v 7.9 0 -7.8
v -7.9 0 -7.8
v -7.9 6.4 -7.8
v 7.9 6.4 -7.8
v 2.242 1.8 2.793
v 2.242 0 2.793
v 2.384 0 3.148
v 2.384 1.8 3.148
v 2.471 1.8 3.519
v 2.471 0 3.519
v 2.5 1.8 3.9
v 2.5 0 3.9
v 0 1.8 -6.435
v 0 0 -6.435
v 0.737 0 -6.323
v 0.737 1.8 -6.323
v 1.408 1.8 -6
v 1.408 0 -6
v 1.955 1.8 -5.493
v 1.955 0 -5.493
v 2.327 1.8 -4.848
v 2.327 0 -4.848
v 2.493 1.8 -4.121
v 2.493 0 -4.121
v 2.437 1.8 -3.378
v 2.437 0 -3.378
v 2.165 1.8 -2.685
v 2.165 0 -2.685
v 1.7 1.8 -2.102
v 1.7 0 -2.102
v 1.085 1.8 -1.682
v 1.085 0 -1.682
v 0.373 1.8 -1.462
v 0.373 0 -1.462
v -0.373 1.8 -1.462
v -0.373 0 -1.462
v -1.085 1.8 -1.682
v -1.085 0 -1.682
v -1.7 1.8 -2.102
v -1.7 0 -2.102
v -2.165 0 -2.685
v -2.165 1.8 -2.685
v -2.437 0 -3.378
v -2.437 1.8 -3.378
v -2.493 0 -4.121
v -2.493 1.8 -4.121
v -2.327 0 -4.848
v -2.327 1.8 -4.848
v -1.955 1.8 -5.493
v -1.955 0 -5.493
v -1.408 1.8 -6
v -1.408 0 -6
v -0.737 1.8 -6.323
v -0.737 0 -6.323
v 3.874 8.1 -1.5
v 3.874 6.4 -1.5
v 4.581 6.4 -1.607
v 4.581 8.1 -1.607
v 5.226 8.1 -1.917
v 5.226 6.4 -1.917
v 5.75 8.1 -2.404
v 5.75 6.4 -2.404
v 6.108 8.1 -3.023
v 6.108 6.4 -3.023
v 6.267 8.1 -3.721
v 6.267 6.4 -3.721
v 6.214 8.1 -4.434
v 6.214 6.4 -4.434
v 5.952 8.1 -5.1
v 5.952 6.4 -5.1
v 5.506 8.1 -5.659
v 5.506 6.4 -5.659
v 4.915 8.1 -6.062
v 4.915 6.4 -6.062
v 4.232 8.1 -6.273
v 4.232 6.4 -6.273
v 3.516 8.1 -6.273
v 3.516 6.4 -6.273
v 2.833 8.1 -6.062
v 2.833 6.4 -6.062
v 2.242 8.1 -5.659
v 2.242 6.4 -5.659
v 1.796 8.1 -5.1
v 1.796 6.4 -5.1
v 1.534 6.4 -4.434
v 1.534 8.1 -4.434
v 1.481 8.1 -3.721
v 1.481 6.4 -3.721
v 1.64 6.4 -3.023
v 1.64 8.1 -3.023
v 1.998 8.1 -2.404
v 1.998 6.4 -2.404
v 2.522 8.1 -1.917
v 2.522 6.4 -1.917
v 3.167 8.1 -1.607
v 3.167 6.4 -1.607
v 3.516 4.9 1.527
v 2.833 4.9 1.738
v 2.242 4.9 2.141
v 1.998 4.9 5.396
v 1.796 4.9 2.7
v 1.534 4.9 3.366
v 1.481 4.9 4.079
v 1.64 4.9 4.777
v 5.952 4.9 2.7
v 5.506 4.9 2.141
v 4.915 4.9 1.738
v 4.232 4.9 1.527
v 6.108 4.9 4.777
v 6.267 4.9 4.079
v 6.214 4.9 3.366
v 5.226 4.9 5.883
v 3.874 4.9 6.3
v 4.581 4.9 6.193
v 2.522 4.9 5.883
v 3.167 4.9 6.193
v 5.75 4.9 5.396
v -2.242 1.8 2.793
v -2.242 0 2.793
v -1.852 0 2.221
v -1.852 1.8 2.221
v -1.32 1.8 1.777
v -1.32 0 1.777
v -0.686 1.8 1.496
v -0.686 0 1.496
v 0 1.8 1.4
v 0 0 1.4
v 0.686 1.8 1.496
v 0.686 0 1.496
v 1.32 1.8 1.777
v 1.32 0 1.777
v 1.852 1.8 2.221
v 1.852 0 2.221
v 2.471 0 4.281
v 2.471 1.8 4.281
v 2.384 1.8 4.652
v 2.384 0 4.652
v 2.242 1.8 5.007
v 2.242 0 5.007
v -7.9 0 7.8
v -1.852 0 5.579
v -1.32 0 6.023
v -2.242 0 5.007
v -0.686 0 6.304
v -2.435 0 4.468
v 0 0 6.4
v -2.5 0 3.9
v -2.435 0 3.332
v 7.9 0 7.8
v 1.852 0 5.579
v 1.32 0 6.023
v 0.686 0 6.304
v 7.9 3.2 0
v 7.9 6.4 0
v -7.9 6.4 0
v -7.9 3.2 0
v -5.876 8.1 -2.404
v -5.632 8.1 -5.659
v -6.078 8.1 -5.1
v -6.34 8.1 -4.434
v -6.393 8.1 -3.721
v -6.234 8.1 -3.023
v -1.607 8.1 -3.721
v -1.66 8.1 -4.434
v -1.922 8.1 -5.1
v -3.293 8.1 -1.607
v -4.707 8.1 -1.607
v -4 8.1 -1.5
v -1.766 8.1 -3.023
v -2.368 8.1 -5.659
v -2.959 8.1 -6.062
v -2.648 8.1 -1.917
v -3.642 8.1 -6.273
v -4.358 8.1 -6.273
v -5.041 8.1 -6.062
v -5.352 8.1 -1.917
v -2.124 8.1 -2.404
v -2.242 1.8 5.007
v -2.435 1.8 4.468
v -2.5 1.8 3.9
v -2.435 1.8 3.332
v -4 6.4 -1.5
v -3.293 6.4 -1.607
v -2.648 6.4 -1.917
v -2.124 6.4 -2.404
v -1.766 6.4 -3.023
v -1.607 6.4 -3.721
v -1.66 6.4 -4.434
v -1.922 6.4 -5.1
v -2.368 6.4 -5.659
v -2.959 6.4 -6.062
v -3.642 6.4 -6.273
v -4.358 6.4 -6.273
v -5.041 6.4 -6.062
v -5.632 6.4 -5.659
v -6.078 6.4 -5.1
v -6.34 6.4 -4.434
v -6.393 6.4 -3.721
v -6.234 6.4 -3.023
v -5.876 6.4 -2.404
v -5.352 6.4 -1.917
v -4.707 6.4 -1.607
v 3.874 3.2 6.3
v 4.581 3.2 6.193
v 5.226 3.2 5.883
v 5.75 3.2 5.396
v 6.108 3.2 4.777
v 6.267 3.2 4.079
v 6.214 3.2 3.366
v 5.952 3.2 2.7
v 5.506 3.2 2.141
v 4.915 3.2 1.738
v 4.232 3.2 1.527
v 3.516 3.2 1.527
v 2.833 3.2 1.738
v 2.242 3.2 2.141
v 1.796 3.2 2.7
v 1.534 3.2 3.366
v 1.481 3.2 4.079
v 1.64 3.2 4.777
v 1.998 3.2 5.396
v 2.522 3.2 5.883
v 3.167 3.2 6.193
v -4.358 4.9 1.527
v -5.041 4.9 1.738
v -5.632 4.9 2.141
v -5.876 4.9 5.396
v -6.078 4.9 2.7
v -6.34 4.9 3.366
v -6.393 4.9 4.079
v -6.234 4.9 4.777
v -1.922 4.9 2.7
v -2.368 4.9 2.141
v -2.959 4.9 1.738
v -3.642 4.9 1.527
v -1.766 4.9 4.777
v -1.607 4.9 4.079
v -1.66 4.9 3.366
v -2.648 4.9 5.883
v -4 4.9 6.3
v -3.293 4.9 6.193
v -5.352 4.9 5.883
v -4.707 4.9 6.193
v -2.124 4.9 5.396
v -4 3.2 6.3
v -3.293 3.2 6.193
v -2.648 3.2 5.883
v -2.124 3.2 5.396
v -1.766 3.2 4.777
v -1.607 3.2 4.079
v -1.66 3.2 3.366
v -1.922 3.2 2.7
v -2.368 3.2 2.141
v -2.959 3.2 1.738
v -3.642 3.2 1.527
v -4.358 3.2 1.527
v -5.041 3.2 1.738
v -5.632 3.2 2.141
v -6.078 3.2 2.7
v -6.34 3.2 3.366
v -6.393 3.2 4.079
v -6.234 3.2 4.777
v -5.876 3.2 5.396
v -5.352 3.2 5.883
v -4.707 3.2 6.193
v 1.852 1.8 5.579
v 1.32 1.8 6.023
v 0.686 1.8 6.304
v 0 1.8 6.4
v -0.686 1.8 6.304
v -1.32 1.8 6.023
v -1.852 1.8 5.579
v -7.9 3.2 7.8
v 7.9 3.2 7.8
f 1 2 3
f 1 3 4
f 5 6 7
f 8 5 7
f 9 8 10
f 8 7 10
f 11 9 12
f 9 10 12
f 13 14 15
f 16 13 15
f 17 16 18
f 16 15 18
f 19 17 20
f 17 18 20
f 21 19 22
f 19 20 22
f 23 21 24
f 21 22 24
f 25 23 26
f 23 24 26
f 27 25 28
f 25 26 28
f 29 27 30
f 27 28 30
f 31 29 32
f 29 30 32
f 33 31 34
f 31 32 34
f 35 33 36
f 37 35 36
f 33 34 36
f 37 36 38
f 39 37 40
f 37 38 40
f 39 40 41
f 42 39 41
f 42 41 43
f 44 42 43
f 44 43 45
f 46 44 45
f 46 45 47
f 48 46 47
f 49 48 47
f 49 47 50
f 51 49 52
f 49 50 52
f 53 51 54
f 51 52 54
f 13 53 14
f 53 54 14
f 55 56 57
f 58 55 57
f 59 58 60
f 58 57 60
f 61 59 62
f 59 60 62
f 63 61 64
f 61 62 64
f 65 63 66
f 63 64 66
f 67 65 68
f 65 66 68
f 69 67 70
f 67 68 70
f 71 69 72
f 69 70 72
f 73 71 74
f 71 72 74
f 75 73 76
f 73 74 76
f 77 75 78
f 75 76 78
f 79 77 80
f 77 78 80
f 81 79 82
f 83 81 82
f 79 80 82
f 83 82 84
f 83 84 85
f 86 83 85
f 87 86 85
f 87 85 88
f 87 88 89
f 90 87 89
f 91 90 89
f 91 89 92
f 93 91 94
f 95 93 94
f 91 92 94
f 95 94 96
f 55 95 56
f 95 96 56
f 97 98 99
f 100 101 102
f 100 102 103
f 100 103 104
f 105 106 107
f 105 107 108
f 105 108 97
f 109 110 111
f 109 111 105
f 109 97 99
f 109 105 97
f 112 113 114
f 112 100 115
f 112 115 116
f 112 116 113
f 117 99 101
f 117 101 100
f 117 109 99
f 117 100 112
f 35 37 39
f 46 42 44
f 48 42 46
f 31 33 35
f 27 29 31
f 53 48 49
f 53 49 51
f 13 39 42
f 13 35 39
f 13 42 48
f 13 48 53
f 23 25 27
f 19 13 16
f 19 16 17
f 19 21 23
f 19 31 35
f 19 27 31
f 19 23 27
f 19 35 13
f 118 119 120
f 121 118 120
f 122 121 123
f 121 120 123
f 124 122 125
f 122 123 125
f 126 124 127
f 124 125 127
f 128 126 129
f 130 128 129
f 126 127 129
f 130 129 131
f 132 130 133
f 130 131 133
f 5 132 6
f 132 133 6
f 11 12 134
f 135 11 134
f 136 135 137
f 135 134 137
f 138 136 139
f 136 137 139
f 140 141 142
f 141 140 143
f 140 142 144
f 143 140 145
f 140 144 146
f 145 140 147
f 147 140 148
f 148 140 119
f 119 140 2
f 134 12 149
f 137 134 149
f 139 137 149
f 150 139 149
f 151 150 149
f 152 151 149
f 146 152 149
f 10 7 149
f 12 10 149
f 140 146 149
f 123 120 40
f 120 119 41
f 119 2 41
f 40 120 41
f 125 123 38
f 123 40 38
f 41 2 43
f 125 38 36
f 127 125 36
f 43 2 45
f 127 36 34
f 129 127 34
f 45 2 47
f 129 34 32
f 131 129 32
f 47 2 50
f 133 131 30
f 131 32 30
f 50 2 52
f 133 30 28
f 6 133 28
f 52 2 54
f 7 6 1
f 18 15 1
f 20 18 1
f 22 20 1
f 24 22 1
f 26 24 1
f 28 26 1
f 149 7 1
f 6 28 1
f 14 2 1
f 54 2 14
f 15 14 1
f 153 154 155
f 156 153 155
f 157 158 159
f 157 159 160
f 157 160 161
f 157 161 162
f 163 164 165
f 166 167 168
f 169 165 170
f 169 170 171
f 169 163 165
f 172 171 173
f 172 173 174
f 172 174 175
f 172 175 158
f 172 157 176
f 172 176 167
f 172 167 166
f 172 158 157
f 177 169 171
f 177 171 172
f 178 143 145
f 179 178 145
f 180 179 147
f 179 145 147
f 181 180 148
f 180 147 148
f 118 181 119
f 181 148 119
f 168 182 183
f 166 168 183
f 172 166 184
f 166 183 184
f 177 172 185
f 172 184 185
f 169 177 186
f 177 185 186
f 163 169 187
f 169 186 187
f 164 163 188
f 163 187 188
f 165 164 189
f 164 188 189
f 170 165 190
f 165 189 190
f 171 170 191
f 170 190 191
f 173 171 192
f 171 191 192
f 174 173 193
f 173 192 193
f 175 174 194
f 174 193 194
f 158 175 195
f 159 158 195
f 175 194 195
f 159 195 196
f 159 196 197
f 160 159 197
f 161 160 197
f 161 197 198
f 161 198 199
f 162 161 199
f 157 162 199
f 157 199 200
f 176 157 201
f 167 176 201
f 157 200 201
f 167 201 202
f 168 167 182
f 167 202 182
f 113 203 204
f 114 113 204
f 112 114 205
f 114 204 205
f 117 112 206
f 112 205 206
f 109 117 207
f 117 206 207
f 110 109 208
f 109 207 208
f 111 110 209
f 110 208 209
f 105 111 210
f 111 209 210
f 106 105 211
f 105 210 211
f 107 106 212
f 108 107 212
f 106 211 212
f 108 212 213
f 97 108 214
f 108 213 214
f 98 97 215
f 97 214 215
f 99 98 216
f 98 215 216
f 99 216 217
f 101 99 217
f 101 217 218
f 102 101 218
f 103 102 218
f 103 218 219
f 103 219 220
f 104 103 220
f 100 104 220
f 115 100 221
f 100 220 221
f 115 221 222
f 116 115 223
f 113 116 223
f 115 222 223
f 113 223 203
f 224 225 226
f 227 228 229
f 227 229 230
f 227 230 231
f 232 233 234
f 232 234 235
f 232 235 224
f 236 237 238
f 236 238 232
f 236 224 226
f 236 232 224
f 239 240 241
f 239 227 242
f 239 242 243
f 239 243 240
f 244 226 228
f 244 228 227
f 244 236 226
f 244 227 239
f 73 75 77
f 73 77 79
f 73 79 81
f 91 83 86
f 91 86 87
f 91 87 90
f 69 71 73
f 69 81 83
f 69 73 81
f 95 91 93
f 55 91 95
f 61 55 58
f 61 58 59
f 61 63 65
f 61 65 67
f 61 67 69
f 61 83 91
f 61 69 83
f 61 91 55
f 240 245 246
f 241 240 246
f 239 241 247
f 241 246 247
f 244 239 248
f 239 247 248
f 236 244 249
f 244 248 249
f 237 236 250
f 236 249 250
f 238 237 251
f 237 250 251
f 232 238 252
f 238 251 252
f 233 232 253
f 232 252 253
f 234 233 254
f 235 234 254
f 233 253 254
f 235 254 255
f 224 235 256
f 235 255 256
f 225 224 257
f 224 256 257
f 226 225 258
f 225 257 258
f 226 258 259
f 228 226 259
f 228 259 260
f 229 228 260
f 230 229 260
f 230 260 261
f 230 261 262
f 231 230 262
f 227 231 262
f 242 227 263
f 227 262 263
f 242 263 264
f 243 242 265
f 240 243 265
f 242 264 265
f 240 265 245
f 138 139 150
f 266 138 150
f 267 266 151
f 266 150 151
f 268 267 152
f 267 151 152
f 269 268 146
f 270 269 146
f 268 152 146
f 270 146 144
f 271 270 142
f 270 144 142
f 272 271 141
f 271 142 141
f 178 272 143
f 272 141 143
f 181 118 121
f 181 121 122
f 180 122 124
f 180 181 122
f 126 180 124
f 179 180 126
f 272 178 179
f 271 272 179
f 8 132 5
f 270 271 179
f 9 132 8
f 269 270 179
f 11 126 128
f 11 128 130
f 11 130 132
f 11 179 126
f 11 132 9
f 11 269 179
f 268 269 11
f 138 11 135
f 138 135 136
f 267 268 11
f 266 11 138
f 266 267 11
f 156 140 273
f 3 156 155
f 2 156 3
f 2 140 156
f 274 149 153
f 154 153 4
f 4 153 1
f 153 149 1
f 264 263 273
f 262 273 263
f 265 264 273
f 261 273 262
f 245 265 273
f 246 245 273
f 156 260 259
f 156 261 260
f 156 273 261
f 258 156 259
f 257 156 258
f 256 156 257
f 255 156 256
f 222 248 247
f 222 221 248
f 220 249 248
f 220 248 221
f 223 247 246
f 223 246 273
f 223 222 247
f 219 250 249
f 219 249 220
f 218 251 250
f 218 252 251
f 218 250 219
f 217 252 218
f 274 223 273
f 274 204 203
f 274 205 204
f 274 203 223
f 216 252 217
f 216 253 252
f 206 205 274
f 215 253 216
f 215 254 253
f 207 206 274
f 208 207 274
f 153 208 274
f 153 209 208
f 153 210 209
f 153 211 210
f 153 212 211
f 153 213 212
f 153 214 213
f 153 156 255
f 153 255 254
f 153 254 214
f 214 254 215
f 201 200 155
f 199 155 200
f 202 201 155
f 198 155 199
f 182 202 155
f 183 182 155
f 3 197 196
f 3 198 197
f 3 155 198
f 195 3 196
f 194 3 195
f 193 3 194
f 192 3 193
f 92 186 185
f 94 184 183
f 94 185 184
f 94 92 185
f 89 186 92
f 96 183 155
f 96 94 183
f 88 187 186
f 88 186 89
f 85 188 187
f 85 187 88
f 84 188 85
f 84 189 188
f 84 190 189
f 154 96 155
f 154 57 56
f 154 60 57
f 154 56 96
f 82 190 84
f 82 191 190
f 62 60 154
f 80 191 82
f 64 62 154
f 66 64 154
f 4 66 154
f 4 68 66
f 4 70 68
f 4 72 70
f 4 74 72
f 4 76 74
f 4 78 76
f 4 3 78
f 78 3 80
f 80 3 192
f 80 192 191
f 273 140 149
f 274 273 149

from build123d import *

# Parameters (mm, degrees)
SKETCH_1_W          = 15.8
SKETCH_1_H          = 15.600000042
EXTRUDE_2_DEPTH     = 6.4
CUT_EXTRUDE_1_DEPTH = 3.2
SKETCH_3_R          = 2.400000003
EXTRUDE_3_DEPTH     = 1.7
SKETCH_4_R          = 2.4
EXTRUDE_4_DEPTH     = 1.7
CUT_EXTRUDE_2_DEPTH = 1.8
SKETCH_6_R          = 2.5
CUT_EXTRUDE_3_DEPTH = 1.8


with BuildPart() as part:
    # Эскиз1 → Бобышка-Вытянуть2 (new body)
    with BuildSketch(Plane(origin=(0, 0, 0), x_dir=(1, 0, 0), z_dir=(0, 1, 0))):
        Rectangle(SKETCH_1_W, SKETCH_1_H)
    extrude(amount=EXTRUDE_2_DEPTH)

    # Эскиз2 → Вырез-Вытянуть1 (cut)
    with BuildSketch(Plane(origin=(0, 6.4, 0), x_dir=(1, 0, 0), z_dir=(0, 1, 0))):
        Polygon((7.9, 0), (0, 0), (-7.9, 0), (-7.9, -7.800000021), (7.9, -7.800000021), align=None)
    extrude(amount=-CUT_EXTRUDE_1_DEPTH, mode=Mode.SUBTRACT)

    # Эскиз3 → Бобышка-Вытянуть3 (add)
    with BuildSketch(Plane(origin=(0, 3.2, 0), x_dir=(1, 0, 0), z_dir=(0, 1, 0))):
        with Locations(Location((-4, -3.900000021, 0), (0, 0, 270))):
            Circle(SKETCH_3_R)
        with Locations(Location((3.874, -3.900000021, 0), (0, 0, 270))):
            Circle(SKETCH_3_R)
    extrude(amount=EXTRUDE_3_DEPTH)

    # Эскиз4 → Бобышка-Вытянуть4 (add)
    with BuildSketch(Plane(origin=(0, 6.4, 0), x_dir=(1, 0, 0), z_dir=(0, 1, 0))):
        with Locations(Location((-4, 3.900000021, 0), (0, 0, 270))):
            Circle(SKETCH_4_R)
        with Locations(Location((3.874, 3.900000021, 0), (0, 0, 270))):
            Circle(SKETCH_4_R)
    extrude(amount=EXTRUDE_4_DEPTH)

    # Эскиз5 → Вырез-Вытянуть2 (cut)
    with BuildSketch(Plane.XZ):
        with BuildLine():
            ThreePointArc((2.241714395, 5.006669145), (0, 6.400000011), (-2.241714395, 5.006669145))
            Line((-2.241714395, 5.006669145), (0, 3.900000011))
            Line((0, 3.900000011), (2.241714395, 5.006669145))
        make_face()
        with BuildLine():
            Line((0, 3.900000011), (-2.241714395, 5.006669145))
            ThreePointArc((-2.241714395, 5.006669145), (-2.5, 3.900000011), (-2.241714395, 2.793330876))
            Line((-2.241714395, 2.793330876), (0, 3.900000011))
        make_face()
        with BuildLine():
            Line((0, 3.900000011), (-2.241714395, 2.793330876))
            ThreePointArc((-2.241714395, 2.793330876), (0, 1.400000011), (2.241714395, 2.793330876))
            Line((2.241714395, 2.793330876), (0, 3.900000011))
        make_face()
        with BuildLine():
            Line((2.241714395, 5.006669145), (0, 3.900000011))
            Line((0, 3.900000011), (2.241714395, 2.793330876))
            ThreePointArc((2.241714395, 2.793330876), (2.434572446, 3.331794936), (2.5, 3.900000011))
            ThreePointArc((2.5, 3.900000011), (2.434572446, 4.468205085), (2.241714395, 5.006669145))
        make_face()
    extrude(amount=-CUT_EXTRUDE_2_DEPTH, mode=Mode.SUBTRACT)

    # Эскиз6 → Вырез-Вытянуть3 (cut)
    with BuildSketch(Plane.XZ):
        with Locations(Location((0, -3.934549789, 0), (0, 0, 270))):
            Circle(SKETCH_6_R)
    extrude(amount=-CUT_EXTRUDE_3_DEPTH, mode=Mode.SUBTRACT)


solid = part.part
